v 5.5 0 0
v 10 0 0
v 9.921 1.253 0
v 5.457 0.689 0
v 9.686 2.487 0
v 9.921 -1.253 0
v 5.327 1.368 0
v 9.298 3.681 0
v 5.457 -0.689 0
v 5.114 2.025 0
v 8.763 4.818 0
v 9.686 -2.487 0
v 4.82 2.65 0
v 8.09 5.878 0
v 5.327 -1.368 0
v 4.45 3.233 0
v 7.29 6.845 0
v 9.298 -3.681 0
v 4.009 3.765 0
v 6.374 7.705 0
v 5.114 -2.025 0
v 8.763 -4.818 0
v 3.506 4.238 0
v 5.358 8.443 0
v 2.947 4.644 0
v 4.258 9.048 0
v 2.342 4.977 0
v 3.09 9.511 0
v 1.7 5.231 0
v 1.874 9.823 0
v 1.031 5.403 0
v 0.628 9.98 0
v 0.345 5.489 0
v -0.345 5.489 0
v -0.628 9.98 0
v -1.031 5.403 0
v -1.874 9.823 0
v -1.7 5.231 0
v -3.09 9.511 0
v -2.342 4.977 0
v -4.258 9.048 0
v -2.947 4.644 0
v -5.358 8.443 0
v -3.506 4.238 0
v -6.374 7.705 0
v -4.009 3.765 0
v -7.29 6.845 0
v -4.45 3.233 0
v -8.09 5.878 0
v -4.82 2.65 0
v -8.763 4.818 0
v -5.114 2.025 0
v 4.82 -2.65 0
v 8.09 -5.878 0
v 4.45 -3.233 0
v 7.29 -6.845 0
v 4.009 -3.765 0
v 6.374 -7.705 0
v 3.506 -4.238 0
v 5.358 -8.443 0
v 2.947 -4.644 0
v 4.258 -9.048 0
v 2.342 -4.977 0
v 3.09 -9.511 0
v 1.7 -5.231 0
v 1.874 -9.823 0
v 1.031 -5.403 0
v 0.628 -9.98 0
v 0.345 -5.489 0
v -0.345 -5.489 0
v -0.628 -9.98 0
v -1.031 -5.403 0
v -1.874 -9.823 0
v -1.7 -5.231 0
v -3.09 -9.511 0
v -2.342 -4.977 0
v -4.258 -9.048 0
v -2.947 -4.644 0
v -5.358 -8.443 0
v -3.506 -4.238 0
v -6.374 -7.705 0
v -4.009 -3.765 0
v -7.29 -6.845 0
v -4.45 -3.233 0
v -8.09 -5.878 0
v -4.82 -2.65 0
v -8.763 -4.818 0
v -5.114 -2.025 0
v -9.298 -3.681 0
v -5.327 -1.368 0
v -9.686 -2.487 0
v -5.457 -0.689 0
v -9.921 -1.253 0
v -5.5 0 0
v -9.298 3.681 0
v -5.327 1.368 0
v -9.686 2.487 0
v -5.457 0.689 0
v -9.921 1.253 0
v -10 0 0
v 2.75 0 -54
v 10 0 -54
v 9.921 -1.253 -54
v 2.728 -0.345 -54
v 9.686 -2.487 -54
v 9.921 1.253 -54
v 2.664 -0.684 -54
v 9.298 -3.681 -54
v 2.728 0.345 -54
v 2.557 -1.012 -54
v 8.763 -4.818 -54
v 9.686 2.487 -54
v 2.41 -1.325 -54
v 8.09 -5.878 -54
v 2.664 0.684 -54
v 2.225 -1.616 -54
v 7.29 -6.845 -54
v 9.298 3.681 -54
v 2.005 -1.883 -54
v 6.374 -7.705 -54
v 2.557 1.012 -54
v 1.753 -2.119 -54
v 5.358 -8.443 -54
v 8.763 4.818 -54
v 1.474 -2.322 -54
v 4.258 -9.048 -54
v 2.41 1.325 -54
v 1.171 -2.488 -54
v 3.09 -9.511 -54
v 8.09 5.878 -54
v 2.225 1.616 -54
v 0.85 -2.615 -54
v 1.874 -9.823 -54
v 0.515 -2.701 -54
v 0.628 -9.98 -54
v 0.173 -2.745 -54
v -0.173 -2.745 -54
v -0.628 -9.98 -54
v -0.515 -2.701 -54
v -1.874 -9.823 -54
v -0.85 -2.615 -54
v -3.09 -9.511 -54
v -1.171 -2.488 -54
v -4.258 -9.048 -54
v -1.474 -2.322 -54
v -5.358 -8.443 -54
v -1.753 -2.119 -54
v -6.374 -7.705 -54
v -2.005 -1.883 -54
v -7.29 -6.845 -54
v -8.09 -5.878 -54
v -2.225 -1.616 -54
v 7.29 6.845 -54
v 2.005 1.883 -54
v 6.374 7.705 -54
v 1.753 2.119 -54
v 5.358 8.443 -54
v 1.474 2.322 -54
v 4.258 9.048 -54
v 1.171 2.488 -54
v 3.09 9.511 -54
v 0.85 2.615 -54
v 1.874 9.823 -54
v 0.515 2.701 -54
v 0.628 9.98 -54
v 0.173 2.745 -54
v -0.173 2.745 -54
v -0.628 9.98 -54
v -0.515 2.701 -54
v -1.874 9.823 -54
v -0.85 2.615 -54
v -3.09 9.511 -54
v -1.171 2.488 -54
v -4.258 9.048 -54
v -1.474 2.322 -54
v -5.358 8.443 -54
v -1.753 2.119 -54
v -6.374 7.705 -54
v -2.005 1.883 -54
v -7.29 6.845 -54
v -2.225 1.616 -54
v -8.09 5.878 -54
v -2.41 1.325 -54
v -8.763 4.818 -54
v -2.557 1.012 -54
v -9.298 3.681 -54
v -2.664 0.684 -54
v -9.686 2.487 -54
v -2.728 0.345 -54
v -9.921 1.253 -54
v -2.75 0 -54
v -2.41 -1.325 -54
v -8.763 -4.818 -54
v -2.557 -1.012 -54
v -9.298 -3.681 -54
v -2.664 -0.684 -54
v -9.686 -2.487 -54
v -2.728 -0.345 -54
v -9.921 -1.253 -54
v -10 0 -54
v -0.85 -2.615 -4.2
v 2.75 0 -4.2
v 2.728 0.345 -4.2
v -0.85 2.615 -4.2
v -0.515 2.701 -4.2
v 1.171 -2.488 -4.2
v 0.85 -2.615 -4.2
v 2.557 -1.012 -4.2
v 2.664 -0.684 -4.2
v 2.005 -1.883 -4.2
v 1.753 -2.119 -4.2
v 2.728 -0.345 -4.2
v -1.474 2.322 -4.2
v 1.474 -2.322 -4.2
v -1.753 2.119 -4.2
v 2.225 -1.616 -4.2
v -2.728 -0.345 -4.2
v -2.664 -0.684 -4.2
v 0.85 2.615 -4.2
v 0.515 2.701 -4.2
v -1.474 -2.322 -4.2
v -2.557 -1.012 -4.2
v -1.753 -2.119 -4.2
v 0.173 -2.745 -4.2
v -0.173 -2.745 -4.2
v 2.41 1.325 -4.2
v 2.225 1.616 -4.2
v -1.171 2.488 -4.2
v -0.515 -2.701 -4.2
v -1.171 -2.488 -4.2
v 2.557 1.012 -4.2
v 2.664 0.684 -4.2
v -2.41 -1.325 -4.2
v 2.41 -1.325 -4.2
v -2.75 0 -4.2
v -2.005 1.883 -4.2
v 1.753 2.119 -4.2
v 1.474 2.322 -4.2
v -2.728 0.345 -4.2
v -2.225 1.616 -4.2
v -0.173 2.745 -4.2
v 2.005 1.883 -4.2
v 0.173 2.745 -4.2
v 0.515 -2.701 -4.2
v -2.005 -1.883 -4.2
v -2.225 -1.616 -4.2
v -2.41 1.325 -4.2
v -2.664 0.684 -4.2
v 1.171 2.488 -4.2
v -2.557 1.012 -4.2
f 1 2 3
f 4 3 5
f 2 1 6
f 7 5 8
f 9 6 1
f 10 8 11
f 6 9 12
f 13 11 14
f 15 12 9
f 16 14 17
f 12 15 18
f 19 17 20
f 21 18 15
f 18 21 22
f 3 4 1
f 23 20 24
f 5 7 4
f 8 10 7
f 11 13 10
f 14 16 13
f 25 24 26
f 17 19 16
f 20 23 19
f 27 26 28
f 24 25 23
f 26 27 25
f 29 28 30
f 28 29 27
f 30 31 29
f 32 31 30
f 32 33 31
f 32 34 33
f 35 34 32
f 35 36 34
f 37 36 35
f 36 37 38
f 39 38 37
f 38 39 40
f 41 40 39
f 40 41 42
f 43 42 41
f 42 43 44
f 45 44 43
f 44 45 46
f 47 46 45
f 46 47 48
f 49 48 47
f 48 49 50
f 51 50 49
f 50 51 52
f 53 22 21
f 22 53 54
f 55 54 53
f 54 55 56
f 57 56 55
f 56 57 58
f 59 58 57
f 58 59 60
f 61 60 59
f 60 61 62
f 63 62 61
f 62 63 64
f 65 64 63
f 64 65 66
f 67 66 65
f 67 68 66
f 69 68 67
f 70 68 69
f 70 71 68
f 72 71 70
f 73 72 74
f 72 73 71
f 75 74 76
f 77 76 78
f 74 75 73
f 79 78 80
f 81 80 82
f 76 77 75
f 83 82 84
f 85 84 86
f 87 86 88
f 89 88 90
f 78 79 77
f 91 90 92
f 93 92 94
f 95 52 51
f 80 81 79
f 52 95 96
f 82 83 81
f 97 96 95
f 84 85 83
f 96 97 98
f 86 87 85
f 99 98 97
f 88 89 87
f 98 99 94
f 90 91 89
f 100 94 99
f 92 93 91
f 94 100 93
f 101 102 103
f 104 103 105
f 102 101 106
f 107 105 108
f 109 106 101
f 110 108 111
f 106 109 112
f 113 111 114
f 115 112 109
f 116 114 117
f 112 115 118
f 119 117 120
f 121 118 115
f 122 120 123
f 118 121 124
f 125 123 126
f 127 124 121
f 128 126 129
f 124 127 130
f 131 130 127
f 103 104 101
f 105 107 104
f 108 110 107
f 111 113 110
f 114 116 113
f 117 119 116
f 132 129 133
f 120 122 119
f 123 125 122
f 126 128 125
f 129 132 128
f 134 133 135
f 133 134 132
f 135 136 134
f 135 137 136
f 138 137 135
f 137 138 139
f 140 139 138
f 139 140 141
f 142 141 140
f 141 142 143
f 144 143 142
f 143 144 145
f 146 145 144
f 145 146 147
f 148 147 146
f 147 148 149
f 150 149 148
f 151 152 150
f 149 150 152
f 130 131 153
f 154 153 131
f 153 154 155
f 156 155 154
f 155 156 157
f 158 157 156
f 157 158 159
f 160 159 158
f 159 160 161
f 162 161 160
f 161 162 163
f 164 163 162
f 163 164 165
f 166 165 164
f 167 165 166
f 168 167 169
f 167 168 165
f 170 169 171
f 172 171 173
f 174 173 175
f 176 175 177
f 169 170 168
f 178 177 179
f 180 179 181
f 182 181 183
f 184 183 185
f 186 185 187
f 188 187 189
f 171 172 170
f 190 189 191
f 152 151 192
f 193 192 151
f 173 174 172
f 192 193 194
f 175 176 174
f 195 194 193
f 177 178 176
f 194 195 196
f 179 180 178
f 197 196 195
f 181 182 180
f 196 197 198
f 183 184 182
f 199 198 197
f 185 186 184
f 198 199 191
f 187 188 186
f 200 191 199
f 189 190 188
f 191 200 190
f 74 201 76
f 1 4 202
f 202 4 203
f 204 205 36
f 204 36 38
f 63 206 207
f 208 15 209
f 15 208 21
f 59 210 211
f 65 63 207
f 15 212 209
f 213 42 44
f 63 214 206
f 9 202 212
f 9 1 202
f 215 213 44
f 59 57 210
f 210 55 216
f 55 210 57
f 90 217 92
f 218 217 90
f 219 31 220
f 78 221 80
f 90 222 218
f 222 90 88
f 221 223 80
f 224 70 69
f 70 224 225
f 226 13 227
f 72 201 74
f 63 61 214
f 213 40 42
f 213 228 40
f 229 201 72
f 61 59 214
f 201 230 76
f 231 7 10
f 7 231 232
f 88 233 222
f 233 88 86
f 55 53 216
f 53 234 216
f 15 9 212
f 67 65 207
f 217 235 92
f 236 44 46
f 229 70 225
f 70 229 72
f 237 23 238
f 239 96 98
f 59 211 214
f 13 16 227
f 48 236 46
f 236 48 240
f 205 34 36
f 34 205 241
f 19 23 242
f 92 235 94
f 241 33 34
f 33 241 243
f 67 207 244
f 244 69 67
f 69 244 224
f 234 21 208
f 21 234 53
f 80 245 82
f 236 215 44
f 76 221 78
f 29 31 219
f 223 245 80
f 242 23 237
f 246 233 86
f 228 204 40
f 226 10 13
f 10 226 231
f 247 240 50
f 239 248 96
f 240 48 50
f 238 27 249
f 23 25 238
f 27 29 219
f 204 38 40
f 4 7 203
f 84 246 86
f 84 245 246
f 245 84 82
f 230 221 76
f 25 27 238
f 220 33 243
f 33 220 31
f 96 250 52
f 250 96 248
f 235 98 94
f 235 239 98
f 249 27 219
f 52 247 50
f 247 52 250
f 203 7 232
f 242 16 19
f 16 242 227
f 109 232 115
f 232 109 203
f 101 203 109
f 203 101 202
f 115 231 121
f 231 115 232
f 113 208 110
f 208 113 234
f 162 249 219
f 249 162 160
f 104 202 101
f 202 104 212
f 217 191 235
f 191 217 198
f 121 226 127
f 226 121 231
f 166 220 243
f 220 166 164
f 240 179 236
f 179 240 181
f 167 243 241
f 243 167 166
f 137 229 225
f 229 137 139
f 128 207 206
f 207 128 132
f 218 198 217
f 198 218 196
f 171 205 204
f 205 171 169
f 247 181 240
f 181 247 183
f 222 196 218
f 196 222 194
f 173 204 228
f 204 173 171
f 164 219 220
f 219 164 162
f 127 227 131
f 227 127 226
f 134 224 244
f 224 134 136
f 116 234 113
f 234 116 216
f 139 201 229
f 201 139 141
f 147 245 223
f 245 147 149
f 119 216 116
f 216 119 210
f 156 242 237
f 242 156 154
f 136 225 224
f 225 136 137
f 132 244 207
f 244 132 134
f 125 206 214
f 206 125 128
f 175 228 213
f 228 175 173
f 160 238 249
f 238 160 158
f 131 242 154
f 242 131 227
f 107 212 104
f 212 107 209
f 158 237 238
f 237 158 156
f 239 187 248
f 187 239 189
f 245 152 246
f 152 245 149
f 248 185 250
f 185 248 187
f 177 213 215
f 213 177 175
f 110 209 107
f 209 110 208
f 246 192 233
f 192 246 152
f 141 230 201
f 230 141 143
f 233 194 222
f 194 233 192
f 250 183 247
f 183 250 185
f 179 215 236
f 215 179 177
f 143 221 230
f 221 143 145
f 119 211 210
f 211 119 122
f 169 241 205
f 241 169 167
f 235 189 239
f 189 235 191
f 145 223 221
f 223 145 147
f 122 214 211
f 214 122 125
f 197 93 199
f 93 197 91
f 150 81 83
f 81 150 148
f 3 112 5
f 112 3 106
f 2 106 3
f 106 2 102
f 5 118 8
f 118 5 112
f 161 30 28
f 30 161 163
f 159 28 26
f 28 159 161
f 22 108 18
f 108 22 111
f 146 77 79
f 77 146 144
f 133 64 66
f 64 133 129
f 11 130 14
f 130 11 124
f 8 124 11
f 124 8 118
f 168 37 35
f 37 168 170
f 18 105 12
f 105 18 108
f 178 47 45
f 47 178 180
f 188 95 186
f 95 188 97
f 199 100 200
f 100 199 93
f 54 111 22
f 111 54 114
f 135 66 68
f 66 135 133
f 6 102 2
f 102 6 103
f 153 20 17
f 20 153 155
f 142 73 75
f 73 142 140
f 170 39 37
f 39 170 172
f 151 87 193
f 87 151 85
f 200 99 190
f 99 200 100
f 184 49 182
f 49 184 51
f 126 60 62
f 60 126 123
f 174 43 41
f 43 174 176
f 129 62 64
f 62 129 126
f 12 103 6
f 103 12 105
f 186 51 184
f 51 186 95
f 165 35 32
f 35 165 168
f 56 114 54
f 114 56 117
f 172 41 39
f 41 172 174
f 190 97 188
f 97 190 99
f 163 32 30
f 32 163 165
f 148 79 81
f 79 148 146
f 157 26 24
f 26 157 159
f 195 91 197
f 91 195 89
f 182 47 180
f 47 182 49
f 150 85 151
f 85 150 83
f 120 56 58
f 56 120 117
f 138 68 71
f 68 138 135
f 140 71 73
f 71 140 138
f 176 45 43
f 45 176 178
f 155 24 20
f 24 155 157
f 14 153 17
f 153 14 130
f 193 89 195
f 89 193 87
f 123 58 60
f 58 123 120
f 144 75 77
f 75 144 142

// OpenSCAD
$fn = 50;


difference() {
	union() {
		translate(v = [0, 0, -54.0000000000]) {
			cylinder(h = 54, r = 10.0000000000);
		}
	}
	union() {
		translate(v = [0, 0, 0]) {
			rotate(a = [0, 0, 0]) {
				difference() {
					union() {
						#translate(v = [0, 0, -54.0000000000]) {
							cylinder(h = 54, r = 2.2500000000);
						}
						#translate(v = [0, 0, -4.2000000000]) {
							cylinder(h = 4.2000000000, r1 = 2.7500000000, r2 = 5.5000000000);
						}
						#translate(v = [0, 0, -54.0000000000]) {
							cylinder(h = 54, r = 2.7500000000);
						}
						#translate(v = [0, 0, -54.0000000000]) {
							cylinder(h = 54, r = 2.2500000000);
						}
					}
					union();
				}
			}
		}
	}
}
